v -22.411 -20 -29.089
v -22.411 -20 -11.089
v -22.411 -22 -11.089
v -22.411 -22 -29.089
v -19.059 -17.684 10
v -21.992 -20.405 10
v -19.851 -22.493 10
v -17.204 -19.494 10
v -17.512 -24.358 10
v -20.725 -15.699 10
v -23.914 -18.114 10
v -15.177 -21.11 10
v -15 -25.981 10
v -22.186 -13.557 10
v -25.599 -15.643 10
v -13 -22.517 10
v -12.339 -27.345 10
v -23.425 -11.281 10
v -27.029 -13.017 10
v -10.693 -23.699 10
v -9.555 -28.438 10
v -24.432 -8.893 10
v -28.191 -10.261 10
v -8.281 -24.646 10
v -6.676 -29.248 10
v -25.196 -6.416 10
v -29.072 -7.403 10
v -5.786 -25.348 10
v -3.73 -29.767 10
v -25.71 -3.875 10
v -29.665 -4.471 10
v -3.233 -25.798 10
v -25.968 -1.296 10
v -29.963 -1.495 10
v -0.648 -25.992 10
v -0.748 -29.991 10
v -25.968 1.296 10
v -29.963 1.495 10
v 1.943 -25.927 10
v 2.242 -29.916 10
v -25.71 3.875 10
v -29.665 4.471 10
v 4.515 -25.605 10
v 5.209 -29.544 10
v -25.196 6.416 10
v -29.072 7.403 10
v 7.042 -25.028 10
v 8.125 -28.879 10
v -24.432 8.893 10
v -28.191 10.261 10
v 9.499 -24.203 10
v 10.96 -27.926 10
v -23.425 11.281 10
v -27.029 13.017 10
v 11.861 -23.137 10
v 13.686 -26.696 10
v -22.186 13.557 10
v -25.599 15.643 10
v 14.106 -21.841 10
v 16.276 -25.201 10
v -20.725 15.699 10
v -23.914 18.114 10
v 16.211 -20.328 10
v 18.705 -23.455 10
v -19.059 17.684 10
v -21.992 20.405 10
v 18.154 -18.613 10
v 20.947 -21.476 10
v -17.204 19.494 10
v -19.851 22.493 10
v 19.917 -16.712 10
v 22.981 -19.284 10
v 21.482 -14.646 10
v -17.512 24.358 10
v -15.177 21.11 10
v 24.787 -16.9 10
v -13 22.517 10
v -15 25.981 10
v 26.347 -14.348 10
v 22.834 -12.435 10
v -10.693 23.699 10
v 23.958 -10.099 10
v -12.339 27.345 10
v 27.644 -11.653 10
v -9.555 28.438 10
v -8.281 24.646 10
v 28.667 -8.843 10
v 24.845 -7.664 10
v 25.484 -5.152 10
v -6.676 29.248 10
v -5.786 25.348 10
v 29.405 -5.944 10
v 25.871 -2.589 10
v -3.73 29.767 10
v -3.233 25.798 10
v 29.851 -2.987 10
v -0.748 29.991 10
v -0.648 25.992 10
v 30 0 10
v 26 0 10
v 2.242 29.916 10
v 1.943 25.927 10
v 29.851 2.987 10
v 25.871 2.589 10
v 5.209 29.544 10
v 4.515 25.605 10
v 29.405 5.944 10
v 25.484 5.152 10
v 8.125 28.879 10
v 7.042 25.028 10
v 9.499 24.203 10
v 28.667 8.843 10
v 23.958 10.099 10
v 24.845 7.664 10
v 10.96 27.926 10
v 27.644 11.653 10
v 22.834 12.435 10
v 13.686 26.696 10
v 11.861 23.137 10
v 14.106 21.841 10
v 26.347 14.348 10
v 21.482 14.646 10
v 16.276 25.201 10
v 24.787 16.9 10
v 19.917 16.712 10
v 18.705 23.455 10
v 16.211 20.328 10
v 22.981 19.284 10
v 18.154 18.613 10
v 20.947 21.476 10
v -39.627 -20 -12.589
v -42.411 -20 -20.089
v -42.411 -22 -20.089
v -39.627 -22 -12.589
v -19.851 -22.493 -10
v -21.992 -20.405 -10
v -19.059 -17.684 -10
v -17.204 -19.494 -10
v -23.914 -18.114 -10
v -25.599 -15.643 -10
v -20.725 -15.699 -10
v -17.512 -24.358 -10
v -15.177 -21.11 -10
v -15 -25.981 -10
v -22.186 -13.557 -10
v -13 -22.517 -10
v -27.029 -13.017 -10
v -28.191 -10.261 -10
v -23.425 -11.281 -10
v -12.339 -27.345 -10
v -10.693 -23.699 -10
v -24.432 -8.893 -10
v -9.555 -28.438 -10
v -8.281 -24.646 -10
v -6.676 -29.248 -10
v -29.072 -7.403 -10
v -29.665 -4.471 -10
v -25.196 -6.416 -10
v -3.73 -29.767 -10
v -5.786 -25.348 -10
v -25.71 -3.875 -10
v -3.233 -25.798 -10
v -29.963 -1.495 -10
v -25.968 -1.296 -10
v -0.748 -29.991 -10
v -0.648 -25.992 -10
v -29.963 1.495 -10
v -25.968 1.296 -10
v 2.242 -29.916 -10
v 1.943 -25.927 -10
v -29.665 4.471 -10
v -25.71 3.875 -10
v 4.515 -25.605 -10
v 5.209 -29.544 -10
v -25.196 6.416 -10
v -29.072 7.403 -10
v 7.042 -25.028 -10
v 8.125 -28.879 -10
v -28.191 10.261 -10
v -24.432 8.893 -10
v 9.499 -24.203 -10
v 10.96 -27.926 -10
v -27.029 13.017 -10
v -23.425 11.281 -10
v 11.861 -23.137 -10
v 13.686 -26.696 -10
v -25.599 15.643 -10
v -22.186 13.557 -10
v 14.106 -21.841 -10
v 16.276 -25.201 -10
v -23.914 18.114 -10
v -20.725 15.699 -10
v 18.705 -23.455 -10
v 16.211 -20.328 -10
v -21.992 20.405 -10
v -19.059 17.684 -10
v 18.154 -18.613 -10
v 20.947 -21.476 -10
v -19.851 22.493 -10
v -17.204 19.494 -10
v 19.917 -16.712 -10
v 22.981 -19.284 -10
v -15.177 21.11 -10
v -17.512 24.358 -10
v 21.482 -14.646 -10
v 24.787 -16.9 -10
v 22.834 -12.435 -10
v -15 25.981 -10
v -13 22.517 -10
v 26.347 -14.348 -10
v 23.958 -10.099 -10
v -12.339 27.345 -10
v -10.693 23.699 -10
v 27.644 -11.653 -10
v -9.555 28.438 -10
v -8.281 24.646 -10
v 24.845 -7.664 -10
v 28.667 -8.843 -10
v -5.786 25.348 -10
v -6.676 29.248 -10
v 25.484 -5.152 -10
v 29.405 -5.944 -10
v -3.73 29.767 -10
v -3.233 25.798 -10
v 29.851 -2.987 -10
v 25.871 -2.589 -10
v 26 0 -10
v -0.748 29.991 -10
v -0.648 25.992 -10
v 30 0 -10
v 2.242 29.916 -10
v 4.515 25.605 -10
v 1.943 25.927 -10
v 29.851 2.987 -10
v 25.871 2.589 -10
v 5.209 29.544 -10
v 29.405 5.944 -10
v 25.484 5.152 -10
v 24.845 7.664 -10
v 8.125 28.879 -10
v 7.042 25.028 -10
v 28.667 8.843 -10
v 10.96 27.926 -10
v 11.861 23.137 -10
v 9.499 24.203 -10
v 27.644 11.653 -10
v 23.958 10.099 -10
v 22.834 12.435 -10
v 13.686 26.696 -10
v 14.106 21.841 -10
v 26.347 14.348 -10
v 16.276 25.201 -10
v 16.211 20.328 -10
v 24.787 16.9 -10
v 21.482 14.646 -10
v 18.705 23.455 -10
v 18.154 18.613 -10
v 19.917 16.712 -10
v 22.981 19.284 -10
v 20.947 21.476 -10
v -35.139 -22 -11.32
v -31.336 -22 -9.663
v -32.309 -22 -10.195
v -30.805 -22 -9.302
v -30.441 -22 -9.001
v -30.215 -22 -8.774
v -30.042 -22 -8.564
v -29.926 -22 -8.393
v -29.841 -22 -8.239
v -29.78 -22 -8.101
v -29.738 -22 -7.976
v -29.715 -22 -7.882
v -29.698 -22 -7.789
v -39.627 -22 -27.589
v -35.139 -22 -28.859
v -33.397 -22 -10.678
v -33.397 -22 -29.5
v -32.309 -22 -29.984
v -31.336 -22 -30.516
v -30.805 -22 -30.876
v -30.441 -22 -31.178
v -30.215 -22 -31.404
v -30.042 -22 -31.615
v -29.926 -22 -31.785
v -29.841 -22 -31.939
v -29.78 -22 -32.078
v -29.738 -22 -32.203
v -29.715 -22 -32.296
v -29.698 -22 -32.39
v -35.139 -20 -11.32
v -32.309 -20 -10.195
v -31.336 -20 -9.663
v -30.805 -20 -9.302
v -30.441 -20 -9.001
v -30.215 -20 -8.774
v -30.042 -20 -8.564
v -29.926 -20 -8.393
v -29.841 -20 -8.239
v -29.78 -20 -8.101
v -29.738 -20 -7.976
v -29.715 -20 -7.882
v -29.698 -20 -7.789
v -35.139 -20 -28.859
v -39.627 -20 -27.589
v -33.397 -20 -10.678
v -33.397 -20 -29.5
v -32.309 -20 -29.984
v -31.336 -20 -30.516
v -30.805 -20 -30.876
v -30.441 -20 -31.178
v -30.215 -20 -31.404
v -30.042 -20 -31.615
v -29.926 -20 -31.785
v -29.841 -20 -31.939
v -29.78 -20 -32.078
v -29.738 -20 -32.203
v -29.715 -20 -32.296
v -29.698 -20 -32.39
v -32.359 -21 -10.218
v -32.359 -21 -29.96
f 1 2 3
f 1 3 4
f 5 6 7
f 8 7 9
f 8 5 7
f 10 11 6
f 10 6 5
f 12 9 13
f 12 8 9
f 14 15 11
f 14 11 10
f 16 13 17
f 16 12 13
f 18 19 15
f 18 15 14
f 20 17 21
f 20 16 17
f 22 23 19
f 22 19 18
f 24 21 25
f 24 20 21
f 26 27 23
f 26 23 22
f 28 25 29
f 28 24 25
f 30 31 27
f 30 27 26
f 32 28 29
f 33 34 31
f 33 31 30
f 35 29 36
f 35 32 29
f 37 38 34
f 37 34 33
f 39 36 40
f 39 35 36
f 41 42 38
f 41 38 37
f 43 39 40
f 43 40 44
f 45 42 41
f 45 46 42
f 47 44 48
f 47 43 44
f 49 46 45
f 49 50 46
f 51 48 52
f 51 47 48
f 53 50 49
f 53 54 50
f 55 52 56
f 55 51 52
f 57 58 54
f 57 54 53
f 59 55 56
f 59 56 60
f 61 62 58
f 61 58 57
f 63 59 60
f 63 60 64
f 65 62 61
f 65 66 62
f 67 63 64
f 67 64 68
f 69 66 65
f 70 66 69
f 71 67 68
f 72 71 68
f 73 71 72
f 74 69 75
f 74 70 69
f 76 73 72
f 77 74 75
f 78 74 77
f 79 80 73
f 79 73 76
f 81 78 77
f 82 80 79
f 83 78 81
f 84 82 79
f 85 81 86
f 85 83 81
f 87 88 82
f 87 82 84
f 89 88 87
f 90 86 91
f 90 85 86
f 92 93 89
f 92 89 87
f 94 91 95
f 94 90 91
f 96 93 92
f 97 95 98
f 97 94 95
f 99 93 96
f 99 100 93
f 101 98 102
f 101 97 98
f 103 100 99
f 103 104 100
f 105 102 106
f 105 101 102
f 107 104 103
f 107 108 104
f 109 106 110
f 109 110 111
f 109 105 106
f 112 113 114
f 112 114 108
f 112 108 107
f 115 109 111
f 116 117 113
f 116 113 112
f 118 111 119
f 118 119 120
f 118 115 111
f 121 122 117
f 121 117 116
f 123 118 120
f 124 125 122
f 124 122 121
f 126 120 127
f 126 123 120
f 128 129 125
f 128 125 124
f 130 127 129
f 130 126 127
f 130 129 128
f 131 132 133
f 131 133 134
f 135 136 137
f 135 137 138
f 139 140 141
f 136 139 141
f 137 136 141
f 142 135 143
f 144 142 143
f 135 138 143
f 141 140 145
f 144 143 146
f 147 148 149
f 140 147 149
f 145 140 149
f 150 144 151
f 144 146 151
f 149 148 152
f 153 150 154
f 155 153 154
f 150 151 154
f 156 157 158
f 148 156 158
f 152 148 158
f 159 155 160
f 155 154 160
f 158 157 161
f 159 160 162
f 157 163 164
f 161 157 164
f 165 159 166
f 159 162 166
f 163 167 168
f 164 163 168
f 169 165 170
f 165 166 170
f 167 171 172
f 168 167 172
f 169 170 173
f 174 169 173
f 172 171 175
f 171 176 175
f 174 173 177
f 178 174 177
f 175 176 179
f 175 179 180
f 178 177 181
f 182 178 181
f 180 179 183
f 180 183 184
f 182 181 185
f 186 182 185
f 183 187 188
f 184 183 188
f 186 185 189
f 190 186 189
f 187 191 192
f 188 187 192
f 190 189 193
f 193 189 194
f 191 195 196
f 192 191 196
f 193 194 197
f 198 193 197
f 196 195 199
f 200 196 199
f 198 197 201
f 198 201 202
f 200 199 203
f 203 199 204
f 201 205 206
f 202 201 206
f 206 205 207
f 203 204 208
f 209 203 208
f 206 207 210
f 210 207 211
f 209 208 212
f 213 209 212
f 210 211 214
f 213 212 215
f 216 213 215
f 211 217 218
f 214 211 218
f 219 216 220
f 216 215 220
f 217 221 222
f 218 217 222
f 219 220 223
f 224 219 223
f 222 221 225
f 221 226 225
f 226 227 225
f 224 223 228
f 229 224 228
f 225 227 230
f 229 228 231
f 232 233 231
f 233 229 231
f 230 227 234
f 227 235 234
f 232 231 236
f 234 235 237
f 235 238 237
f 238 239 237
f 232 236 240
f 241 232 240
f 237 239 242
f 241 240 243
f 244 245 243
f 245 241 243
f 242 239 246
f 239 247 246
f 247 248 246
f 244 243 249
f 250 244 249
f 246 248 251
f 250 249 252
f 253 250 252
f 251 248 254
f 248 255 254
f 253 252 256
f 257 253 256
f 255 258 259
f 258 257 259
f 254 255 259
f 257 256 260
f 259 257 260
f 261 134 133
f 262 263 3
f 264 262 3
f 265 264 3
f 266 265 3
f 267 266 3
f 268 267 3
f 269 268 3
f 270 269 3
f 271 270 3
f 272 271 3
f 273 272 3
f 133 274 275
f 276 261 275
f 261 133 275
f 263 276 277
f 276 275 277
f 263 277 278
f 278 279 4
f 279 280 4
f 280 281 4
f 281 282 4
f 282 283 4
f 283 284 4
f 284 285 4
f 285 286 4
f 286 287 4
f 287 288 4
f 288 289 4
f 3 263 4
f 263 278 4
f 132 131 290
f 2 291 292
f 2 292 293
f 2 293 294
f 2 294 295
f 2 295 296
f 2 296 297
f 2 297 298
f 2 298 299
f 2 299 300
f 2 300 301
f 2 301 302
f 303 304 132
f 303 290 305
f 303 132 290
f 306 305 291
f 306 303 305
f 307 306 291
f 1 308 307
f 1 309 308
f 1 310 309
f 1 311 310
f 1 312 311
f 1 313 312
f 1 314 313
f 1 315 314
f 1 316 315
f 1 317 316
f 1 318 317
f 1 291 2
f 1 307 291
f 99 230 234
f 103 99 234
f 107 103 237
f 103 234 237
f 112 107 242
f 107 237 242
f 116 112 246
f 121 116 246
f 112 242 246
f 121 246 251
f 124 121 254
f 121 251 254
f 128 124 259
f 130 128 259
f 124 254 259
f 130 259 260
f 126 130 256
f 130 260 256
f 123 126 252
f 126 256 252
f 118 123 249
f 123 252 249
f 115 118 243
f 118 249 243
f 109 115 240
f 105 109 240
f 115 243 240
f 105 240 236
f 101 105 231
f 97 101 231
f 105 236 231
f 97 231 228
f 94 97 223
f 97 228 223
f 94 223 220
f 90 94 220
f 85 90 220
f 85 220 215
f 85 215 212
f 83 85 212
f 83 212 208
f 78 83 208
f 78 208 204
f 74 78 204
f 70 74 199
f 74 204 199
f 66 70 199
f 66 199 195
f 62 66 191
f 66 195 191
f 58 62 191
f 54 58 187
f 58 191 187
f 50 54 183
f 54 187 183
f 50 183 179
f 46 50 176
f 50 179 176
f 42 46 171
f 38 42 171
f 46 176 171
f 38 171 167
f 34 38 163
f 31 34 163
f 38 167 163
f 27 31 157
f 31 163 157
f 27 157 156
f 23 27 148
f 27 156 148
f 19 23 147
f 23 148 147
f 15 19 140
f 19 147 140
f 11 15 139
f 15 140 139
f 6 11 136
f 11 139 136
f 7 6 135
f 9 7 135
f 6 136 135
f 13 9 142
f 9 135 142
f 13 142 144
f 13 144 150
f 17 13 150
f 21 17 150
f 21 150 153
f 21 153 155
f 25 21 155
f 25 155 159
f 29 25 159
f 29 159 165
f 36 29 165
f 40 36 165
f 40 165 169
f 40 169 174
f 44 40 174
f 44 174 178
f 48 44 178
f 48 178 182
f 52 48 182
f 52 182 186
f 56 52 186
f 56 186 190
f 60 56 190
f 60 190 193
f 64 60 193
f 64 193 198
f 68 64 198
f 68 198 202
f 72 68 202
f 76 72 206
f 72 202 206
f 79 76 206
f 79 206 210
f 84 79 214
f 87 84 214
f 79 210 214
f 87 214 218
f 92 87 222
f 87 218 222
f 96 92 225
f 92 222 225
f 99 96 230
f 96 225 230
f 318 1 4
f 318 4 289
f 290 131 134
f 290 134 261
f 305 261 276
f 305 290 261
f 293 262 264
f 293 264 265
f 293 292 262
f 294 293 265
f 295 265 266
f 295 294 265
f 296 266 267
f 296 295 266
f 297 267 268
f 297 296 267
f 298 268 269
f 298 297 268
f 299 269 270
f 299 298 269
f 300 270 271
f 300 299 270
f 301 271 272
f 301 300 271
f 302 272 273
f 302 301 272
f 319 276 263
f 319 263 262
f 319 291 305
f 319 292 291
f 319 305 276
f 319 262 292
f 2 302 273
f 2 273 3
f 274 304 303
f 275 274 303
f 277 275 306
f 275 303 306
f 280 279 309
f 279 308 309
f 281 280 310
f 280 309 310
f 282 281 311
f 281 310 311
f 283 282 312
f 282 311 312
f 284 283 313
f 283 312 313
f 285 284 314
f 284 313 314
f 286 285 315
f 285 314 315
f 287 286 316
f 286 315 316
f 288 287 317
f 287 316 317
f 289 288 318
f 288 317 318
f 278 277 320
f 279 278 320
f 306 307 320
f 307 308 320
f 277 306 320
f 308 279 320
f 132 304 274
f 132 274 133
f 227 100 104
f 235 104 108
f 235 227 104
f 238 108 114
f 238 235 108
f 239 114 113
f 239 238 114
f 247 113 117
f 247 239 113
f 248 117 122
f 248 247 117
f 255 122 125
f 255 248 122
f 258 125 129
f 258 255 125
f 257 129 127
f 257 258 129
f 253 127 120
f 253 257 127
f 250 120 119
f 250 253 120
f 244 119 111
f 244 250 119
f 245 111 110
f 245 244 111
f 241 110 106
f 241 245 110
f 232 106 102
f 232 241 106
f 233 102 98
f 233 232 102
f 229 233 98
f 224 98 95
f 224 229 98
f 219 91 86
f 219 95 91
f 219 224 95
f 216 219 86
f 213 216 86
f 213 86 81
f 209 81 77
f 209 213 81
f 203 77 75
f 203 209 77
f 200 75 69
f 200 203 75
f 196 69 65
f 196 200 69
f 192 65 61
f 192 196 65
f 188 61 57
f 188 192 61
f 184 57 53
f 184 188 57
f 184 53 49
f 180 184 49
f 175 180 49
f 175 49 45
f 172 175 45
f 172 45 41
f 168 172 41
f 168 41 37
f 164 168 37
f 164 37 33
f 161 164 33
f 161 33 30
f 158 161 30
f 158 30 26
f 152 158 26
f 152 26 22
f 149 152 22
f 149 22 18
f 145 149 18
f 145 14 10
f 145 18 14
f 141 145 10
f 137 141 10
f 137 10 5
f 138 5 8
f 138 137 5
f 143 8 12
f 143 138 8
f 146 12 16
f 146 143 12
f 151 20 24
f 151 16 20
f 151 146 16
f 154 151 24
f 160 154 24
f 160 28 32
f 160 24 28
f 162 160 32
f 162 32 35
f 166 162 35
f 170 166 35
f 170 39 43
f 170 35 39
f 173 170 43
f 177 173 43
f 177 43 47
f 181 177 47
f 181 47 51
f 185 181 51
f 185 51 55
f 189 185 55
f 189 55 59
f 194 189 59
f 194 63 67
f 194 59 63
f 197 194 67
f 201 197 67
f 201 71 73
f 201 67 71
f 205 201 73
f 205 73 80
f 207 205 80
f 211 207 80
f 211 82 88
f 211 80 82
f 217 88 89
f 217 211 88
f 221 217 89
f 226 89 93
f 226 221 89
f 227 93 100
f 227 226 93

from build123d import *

# Parameters (mm, degrees)
BOSS_EXTRUDE1_DEPTH      = 10
BOSS_EXTRUDE1_DEPTH_BACK = 10
SKETCH1_R                = 30
CUT_EXTRUDE1_DEPTH       = 10
CUT_EXTRUDE1_DEPTH_BACK  = 20
SKETCH2_R                = 26
BOSS_EXTRUDE3_DEPTH      = 2


with BuildPart() as part:
    # Sketch1 → Boss-Extrude1 (new, two sides: drawn at the far end of the back side and taken through both)
    with BuildSketch(Plane.XY.offset(-BOSS_EXTRUDE1_DEPTH_BACK)):
        Circle(SKETCH1_R)
    extrude(amount=BOSS_EXTRUDE1_DEPTH + BOSS_EXTRUDE1_DEPTH_BACK)

    # Sketch2 → Cut-Extrude1 (cut, two sides: drawn at the far end of the back side and taken through both)
    with BuildSketch(Plane.XY.offset(10).offset(-CUT_EXTRUDE1_DEPTH_BACK)):
        Circle(SKETCH2_R)
    extrude(amount=CUT_EXTRUDE1_DEPTH + CUT_EXTRUDE1_DEPTH_BACK, mode=Mode.SUBTRACT)


with BuildPart() as body_2:
    # Sketch7 → Boss-Extrude3 (new body)
    with BuildSketch(Plane(origin=(0, -20, 0), x_dir=(1, 0, 0), z_dir=(0, 1, 0))):
        with BuildLine():
            Line((-29.69800601, 7.788714547), (-22.41056436, 11.089198481))
            Line((-22.41056436, 11.089198481), (-22.41056436, 29.089198481))
            Line((-22.41056436, 29.089198481), (-29.69800601, 32.389682416))
            add(Edge.make_bspline(
                [(-39.626682179, 27.589198481), (-30.054776841, 29.930559954), (-29.69800601, 32.389682416)],
                knots=[0, 0, 0, 1, 1, 1], degree=2))
            Line((-39.626682179, 27.589198481), (-42.41056436, 20.089198481))
            Line((-42.41056436, 20.089198481), (-39.626682179, 12.589198481))
            add(Edge.make_bspline(
                [(-39.626682179, 12.589198481), (-30.054776841, 10.247837009), (-29.69800601, 7.788714547)],
                knots=[0, 0, 0, 1, 1, 1], degree=2))
        make_face()
    extrude(amount=-BOSS_EXTRUDE3_DEPTH)


solid = Compound([part.part, body_2.part])
